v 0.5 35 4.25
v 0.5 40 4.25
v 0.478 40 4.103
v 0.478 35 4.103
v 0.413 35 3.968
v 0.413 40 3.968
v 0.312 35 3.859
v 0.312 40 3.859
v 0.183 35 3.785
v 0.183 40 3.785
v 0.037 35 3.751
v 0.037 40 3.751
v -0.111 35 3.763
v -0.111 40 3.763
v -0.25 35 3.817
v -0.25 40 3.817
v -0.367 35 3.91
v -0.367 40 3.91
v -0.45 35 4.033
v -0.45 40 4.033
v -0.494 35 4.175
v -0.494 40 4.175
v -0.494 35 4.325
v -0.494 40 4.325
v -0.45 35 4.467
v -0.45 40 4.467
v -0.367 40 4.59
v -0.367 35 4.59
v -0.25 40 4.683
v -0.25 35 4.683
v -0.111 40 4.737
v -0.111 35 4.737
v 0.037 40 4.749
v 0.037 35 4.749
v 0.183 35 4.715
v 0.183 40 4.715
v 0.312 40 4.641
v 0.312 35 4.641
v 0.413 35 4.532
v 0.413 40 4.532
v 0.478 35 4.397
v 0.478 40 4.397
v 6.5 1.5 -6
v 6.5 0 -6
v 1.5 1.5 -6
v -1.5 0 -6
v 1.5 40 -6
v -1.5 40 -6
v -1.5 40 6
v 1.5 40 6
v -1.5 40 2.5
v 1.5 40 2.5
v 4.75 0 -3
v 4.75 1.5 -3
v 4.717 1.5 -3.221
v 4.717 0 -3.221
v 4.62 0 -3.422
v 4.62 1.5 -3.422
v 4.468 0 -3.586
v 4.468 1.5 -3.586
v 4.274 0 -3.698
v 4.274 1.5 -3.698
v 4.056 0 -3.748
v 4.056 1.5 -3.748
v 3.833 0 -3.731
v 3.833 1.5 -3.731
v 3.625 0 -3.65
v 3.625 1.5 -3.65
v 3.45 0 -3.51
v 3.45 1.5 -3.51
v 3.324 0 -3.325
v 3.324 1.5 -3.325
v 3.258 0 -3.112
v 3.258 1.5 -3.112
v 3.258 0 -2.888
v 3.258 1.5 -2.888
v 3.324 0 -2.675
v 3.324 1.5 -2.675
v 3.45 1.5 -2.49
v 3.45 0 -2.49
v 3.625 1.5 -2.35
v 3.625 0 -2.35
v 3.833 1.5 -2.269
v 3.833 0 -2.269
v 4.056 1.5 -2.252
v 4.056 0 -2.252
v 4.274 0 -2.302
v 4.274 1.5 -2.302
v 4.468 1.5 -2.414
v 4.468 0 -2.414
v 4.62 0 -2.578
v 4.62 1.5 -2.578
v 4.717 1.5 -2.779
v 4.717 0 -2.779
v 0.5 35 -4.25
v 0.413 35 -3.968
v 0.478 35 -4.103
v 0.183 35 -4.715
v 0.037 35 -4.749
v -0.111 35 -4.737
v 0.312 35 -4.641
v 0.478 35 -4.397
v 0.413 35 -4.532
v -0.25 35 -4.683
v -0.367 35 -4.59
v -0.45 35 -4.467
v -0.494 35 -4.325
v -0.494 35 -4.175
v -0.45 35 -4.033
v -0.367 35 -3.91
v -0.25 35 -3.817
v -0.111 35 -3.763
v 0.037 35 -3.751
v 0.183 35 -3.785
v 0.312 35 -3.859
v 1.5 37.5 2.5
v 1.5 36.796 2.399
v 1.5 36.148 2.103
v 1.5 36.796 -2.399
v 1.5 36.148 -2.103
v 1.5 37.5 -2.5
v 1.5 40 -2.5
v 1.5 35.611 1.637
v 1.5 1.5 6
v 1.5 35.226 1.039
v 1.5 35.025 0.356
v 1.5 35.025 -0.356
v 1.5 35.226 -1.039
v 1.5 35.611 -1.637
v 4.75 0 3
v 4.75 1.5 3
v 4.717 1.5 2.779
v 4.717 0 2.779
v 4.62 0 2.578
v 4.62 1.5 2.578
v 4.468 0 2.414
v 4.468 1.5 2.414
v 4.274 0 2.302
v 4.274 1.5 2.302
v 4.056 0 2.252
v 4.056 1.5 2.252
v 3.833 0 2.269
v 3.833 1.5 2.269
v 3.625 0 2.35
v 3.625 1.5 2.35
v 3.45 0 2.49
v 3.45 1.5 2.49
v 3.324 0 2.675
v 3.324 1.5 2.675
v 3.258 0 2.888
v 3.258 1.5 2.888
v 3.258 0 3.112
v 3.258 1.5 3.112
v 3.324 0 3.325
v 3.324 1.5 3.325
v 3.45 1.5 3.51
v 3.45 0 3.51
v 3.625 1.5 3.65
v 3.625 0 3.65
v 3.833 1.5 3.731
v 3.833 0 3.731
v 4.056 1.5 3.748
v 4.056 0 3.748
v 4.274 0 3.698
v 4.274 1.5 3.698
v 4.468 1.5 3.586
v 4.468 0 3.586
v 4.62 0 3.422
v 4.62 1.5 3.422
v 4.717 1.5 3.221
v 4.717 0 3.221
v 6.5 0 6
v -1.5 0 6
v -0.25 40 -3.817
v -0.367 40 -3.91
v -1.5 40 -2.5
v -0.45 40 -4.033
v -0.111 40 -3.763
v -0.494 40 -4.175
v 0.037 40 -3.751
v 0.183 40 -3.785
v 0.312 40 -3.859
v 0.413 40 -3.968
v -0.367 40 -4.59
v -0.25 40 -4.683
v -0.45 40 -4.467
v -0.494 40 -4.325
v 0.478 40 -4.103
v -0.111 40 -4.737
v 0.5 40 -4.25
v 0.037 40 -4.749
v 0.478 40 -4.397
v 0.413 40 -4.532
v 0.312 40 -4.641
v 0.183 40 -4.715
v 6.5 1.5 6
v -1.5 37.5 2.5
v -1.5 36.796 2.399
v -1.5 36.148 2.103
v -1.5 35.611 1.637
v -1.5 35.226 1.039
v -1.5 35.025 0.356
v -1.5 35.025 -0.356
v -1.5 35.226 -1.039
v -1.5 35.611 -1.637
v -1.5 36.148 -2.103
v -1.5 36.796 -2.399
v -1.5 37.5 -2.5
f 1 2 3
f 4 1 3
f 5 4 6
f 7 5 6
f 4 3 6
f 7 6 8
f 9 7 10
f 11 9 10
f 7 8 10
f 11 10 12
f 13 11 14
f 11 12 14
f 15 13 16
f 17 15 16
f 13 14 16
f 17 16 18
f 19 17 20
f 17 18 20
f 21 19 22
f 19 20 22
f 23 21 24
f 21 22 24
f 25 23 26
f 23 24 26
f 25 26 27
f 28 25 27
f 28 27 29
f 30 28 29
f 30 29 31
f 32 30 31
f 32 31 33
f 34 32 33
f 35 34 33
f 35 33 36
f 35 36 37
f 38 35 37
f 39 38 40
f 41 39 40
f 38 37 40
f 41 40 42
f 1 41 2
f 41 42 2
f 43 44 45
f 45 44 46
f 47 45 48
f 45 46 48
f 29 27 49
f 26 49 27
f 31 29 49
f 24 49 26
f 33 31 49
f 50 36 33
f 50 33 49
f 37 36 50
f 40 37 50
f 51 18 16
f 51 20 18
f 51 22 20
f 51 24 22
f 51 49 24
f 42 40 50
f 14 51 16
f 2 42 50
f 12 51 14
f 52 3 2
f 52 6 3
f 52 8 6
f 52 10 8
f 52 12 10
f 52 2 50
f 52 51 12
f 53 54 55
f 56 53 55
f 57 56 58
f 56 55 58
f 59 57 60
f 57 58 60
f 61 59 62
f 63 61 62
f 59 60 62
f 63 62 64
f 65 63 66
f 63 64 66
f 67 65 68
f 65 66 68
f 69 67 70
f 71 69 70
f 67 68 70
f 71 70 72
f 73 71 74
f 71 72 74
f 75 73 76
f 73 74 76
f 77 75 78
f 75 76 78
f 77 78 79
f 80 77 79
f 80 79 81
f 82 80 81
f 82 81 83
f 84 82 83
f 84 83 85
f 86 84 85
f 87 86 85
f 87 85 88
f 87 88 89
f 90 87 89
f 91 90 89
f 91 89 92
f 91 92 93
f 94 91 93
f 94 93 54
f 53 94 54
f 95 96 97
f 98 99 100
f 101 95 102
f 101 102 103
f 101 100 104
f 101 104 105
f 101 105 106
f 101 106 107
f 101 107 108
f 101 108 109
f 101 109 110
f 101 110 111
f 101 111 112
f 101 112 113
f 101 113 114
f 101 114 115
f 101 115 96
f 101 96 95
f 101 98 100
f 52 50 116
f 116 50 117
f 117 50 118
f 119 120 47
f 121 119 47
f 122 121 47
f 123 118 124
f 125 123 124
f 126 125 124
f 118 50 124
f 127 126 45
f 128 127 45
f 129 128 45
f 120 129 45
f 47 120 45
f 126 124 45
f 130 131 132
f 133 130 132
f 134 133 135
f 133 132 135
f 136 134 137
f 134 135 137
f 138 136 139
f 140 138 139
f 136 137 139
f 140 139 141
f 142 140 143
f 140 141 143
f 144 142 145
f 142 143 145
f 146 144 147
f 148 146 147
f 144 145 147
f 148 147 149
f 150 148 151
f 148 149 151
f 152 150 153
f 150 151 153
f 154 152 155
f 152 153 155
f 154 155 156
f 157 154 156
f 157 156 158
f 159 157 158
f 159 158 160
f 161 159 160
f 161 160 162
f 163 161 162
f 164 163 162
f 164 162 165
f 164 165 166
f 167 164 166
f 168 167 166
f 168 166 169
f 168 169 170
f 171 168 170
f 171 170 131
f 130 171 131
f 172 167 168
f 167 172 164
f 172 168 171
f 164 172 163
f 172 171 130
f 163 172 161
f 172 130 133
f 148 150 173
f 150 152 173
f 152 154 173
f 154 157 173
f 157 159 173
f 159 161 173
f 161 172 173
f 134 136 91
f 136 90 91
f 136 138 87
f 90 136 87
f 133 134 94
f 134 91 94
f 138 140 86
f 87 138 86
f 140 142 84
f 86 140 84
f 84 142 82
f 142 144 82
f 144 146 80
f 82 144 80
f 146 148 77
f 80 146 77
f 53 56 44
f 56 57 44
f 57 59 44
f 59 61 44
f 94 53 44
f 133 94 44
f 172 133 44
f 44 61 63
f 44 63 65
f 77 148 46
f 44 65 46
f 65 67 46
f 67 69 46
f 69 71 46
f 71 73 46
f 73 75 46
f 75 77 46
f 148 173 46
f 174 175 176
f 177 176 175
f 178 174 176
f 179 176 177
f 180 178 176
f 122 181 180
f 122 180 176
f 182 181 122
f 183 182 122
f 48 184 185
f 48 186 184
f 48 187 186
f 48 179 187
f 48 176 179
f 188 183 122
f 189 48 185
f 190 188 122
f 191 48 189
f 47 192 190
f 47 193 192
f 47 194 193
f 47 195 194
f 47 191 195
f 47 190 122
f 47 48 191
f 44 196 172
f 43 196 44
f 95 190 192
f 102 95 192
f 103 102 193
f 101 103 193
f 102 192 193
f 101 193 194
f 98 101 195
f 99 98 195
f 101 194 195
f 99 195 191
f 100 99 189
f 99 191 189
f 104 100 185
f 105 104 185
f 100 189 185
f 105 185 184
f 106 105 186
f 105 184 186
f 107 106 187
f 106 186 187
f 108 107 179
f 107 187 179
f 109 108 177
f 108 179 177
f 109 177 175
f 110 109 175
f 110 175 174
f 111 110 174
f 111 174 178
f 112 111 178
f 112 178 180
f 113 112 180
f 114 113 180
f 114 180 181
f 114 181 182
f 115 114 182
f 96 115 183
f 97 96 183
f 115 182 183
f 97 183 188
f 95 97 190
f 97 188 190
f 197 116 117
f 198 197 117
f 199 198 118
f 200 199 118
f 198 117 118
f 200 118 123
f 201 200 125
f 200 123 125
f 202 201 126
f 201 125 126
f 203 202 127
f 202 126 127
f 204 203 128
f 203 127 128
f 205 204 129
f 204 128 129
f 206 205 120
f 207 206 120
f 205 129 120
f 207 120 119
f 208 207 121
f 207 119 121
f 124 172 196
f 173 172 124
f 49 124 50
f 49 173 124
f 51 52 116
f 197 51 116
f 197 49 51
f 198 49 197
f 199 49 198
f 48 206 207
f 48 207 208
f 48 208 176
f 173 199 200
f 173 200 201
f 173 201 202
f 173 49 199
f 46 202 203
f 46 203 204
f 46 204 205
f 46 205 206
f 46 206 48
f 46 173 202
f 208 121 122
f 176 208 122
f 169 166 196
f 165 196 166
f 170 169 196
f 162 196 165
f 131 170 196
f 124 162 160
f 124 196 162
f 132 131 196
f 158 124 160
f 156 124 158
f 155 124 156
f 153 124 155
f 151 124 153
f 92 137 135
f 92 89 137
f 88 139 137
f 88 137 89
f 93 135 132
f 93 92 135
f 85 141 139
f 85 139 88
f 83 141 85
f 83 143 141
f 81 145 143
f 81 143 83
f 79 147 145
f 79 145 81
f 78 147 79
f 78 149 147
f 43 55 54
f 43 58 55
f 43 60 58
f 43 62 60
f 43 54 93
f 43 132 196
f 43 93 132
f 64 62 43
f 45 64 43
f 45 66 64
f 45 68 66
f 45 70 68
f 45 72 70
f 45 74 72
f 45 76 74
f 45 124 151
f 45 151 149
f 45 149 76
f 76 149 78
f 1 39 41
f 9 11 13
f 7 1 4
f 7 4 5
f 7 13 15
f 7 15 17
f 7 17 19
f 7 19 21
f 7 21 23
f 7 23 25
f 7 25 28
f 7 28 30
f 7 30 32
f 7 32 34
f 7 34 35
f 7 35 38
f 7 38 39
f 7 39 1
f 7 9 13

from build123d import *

# Parameters (mm, degrees)
SKETCH1_W           = 3
SKETCH1_H           = 12
BOSS_EXTRUDE1_DEPTH = 40
CUT_EXTRUDE1_DEPTH  = 3
SKETCH3_R           = 0.5
CUT_EXTRUDE2_DEPTH  = 5
SKETCH4_W           = 12
SKETCH4_H           = 1.5
BOSS_EXTRUDE2_DEPTH = 5
SKETCH5_R           = 0.75
CUT_EXTRUDE3_DEPTH  = 5


with BuildPart() as part:
    # Sketch1 → Boss-Extrude1 (new body)
    with BuildSketch(Plane(origin=(0, 0, 0), x_dir=(1, 0, 0), z_dir=(0, 1, 0))):
        Rectangle(SKETCH1_W, SKETCH1_H)
    extrude(amount=BOSS_EXTRUDE1_DEPTH)

    # Sketch2 → Cut-Extrude1 (cut)
    with BuildSketch(Plane(origin=(1.5, 0, 0), x_dir=(0, 0, -1), z_dir=(1, 0, 0))):
        with BuildLine():
            Line((-2.5, 40), (-2.5, 37.5))
            ThreePointArc((-2.5, 37.5), (0, 35), (2.5, 37.5))
            Line((2.5, 37.5), (2.5, 40))
            Line((2.5, 40), (-2.5, 40))
        make_face()
    extrude(amount=-CUT_EXTRUDE1_DEPTH, mode=Mode.SUBTRACT)

    # Sketch3 → Cut-Extrude2 (cut)
    with BuildSketch(Plane(origin=(0, 40, 0), x_dir=(1, 0, 0), z_dir=(0, 1, 0))):
        with Locations((0, -4.25)):
            Circle(SKETCH3_R)
        with Locations((0, 4.25)):
            Circle(SKETCH3_R)
    extrude(amount=-CUT_EXTRUDE2_DEPTH, mode=Mode.SUBTRACT)

    # Sketch4 → Boss-Extrude2 (add)
    with BuildSketch(Plane(origin=(1.5, 0, 0), x_dir=(0, 0, -1), z_dir=(1, 0, 0))):
        with Locations((0, 0.75)):
            Rectangle(SKETCH4_W, SKETCH4_H)
    extrude(amount=BOSS_EXTRUDE2_DEPTH)

    # Sketch5 → Cut-Extrude3 (cut)
    with BuildSketch(Plane(origin=(0, 1.5, 0), x_dir=(1, 0, 0), z_dir=(0, 1, 0))):
        with Locations((4, 3)):
            Circle(SKETCH5_R)
        with Locations((4, -3)):
            Circle(SKETCH5_R)
    extrude(amount=-CUT_EXTRUDE3_DEPTH, mode=Mode.SUBTRACT)


solid = part.part
